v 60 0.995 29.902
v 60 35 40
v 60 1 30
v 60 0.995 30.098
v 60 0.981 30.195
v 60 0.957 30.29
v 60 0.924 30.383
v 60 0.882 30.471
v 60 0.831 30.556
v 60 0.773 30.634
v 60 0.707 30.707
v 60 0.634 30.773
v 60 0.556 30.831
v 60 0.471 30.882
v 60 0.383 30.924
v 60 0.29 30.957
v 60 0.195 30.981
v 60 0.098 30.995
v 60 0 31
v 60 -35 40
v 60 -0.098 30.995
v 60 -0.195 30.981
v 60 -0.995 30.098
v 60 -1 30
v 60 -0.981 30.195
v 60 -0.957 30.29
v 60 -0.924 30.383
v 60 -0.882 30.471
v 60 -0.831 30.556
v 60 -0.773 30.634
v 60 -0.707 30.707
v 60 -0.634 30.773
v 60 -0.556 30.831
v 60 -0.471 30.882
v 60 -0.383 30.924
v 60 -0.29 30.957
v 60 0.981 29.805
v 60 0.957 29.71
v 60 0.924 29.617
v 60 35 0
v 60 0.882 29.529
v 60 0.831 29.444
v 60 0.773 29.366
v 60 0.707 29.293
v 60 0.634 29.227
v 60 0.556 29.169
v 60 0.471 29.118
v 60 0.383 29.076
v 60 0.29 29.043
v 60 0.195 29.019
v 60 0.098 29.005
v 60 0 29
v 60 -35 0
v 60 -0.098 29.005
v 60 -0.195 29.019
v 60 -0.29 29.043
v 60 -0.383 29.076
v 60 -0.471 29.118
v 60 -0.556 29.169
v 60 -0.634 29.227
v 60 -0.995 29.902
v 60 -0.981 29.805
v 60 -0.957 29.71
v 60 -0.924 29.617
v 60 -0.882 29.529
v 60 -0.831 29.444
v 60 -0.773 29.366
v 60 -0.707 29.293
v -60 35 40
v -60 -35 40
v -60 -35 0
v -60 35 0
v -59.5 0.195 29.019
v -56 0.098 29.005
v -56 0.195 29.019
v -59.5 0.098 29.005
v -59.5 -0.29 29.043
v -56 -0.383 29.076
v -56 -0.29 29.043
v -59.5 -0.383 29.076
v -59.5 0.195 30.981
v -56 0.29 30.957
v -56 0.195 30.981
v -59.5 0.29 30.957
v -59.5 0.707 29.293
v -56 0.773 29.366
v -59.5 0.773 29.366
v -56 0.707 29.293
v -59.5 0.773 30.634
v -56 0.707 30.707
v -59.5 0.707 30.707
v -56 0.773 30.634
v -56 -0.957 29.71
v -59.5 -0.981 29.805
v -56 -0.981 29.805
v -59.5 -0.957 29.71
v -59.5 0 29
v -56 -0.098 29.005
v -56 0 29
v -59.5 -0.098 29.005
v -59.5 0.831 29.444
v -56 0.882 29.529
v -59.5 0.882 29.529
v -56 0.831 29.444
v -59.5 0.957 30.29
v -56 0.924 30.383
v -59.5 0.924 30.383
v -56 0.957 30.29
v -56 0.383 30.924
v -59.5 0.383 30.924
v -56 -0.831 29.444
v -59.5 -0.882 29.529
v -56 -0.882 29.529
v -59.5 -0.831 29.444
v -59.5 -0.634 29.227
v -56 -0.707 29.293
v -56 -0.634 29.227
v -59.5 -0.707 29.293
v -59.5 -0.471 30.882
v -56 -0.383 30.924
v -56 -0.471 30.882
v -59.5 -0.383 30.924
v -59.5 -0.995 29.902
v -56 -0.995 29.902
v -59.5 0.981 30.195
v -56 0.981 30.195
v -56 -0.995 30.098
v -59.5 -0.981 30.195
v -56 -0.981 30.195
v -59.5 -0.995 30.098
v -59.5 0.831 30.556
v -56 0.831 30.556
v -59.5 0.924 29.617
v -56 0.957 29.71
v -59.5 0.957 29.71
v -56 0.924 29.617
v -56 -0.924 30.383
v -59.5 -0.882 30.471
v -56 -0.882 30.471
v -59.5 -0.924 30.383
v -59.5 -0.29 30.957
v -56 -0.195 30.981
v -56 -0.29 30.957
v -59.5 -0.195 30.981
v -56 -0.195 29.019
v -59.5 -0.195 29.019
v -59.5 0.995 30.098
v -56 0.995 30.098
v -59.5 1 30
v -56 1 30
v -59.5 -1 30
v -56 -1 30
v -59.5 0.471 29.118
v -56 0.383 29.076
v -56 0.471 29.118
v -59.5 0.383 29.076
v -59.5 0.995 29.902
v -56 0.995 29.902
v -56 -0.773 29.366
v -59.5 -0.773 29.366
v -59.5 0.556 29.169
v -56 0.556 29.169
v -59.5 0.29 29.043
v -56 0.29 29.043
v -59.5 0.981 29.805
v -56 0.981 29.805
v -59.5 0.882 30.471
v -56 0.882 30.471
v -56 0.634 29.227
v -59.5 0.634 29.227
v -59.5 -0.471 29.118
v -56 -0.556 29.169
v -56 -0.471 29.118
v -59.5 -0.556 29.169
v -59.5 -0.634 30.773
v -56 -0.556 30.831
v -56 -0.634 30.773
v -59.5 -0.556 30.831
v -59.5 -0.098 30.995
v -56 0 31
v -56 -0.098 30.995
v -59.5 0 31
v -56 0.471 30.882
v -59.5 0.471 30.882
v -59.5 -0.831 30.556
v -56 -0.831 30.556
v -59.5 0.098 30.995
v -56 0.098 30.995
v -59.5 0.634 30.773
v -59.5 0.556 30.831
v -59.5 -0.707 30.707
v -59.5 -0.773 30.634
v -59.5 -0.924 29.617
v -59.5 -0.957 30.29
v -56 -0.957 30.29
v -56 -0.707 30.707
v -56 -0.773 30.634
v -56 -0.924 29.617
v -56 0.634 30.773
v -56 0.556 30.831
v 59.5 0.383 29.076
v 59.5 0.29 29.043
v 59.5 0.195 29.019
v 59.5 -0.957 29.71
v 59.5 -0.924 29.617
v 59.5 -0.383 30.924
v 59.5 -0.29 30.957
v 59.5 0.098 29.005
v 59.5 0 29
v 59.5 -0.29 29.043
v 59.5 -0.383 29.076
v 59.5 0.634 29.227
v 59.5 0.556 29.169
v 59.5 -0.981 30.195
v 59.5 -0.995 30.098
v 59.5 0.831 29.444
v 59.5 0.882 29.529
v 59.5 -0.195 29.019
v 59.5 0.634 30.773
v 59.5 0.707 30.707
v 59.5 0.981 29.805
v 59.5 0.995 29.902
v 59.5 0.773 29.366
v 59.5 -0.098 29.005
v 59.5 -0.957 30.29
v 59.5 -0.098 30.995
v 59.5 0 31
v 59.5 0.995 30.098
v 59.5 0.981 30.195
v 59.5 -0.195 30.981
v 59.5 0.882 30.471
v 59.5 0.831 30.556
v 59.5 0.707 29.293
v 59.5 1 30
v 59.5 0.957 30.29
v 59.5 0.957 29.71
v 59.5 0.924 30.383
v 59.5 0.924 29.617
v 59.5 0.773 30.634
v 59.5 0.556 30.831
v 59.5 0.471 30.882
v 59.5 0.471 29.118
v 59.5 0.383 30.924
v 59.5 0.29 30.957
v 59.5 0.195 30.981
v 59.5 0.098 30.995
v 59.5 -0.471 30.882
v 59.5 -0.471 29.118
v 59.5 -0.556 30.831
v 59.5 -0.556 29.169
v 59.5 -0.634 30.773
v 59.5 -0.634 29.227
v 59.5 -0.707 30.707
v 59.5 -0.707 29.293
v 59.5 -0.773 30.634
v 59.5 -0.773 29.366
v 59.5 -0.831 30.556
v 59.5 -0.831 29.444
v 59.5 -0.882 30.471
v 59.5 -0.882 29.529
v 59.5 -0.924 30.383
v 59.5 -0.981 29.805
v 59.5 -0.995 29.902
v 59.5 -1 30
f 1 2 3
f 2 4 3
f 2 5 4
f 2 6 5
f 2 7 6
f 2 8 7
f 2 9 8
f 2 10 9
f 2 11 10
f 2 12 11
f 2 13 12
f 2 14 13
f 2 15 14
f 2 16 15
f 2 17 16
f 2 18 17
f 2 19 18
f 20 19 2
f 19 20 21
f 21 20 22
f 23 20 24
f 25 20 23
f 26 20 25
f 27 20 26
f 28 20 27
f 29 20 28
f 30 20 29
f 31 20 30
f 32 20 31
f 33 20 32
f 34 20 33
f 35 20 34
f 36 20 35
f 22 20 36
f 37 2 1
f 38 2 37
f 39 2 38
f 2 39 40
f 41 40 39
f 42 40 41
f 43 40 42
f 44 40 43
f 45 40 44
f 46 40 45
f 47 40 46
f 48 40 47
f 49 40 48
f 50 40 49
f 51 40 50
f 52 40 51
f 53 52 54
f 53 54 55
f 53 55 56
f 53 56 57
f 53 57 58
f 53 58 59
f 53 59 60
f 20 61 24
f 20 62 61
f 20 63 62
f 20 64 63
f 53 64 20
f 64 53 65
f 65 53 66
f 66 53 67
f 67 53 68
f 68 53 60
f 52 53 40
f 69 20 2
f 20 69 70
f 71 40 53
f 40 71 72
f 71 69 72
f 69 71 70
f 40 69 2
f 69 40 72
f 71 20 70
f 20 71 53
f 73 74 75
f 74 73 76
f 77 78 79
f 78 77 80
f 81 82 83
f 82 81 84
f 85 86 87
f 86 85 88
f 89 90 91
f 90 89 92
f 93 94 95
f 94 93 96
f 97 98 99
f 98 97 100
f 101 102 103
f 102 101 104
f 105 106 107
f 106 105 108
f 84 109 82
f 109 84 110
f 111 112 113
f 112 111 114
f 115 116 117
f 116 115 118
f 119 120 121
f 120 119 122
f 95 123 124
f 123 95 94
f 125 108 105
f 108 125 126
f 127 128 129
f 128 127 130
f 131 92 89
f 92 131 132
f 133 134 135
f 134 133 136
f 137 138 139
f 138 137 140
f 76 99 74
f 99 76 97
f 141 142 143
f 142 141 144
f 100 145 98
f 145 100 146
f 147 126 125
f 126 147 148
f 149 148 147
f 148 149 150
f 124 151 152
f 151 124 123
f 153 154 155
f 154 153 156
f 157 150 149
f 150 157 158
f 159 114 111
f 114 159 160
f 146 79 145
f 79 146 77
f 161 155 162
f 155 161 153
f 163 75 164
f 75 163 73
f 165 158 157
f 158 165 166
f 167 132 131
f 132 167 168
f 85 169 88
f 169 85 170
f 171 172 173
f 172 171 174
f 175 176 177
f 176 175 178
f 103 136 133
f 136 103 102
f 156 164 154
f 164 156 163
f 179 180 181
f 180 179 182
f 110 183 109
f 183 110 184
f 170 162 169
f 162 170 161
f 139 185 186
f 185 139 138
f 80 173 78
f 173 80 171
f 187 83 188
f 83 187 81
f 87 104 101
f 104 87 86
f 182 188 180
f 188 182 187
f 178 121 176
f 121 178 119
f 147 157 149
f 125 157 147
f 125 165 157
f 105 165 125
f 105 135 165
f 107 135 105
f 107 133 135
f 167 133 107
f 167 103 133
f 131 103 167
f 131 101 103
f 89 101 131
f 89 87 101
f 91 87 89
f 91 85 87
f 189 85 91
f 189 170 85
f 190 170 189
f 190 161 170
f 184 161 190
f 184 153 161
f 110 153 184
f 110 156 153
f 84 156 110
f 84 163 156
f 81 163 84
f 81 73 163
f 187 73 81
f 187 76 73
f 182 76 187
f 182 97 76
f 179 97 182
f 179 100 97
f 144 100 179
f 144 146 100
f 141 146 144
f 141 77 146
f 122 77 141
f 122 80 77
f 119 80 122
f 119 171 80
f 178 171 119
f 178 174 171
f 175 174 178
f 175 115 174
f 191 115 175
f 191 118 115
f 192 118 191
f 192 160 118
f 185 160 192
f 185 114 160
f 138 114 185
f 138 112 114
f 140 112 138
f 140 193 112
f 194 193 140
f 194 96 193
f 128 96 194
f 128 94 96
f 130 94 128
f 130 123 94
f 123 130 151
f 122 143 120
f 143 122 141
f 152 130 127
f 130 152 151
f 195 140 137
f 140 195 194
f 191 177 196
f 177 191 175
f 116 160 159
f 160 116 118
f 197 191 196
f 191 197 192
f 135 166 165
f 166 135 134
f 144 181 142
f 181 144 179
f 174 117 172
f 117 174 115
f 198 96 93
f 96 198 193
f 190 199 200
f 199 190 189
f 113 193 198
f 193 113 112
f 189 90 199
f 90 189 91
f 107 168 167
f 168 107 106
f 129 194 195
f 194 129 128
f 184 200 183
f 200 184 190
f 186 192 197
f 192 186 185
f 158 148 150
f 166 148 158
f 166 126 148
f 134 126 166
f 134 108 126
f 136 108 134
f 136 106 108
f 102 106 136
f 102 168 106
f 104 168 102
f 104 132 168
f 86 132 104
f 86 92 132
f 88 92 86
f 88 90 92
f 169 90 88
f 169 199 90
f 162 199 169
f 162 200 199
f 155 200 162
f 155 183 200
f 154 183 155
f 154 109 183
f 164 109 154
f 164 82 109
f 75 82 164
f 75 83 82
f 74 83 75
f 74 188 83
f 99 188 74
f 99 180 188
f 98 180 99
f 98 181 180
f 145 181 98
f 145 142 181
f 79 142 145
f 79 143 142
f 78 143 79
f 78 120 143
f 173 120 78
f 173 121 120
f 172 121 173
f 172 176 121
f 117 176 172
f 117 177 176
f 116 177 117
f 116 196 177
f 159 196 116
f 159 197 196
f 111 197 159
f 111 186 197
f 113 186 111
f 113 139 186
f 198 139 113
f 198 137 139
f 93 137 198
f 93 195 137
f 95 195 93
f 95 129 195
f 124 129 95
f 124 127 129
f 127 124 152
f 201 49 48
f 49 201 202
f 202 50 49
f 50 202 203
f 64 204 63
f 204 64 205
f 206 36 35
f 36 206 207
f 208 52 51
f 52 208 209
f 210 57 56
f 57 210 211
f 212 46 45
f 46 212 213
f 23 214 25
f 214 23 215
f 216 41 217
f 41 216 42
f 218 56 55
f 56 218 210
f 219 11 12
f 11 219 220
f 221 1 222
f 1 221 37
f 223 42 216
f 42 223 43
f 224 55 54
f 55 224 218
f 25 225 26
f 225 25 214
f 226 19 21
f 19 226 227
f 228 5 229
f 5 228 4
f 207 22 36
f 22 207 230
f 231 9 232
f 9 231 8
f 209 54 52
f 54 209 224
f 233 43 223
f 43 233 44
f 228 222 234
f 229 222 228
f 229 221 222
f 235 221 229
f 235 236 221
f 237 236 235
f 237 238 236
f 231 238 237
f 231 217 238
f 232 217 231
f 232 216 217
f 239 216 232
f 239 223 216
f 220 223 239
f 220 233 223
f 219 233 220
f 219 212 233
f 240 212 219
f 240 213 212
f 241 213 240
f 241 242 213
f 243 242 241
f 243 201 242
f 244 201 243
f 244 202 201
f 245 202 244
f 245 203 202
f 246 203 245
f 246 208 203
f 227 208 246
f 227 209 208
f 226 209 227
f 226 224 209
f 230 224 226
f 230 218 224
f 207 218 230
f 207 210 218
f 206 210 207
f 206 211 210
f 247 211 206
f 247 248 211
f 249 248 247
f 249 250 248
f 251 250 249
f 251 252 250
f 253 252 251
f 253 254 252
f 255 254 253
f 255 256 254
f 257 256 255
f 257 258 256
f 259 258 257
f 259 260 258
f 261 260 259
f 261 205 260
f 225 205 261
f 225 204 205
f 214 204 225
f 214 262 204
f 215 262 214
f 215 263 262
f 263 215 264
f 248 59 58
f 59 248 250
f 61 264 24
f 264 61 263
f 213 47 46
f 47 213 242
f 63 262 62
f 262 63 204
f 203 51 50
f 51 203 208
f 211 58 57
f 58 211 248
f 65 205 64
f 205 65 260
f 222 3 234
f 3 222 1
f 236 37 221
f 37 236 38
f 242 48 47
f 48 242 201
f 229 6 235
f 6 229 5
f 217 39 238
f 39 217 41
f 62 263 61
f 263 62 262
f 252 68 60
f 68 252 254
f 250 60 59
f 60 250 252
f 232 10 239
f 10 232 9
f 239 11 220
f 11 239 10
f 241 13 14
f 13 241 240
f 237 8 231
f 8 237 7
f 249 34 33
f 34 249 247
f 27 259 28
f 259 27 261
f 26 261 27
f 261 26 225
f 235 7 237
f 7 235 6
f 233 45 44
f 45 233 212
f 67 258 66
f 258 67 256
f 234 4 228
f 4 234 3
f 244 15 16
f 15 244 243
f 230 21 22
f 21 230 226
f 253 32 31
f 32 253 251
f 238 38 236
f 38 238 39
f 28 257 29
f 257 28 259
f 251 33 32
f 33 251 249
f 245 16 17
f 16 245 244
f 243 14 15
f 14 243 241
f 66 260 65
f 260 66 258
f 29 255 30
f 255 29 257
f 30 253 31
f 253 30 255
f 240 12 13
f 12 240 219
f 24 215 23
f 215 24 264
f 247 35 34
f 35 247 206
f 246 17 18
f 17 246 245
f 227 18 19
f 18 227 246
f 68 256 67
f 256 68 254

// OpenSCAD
// Mini horizontal gel-electrophoresis box: open-top rectangular tank with a central
// raised gel-tray platform that divides the bottom into two buffer chambers.
// Print orientation: tank rests on the XY plane (z = 0) and builds upward (+Z).

// ---------------- Parameters ----------------
outer_x      = 120;   // outer tank length along X (mm)
outer_y      = 70;    // outer tank width along Y (mm)
outer_h      = 40;    // outer tank height along Z (mm)

wall         = 3;     // tank wall thickness (mm)
floor        = 3;     // tank floor thickness (mm)

platform_x   = 60;    // platform length along X (mm), centred
platform_top = 10;    // platform top height above inner floor (mm) -> z = 13

hole_d       = 2;     // electrode hole diameter (mm)
hole_y       = 0;     // electrode hole Y position (mm)
hole_z       = 30;    // electrode hole Z position (mm)

eps          = 0.5;   // overshoot for clean boolean cuts (mm)

$fn = 64;

// ---------------- Derived ----------------
inner_x = outer_x - 2 * wall;    // 114 mm
inner_y = outer_y - 2 * wall;    // 64 mm
inner_h = outer_h - floor;       // 37 mm (height above floor)

plat_h = floor + platform_top;   // 13 mm absolute height of platform top

// ---------------- Model ----------------
difference() {
    union() {
        // Tank body (outer block)
        translate([-outer_x / 2, -outer_y / 2, 0])
            cube([outer_x, outer_y, outer_h]);

        // Central raised platform for the gel tray
        // Spans the full inner width (Y), centred in X
        translate([-platform_x / 2, -inner_y / 2, floor])
            cube([platform_x, inner_y, plat_h - floor]);
    }

    // Electrode holes through each end wall, along X
    for (sx = [-1, 1])
        translate([sx * (outer_x / 2 - eps), hole_y, hole_z])
            rotate([0, 90, 0])
                cylinder(d = hole_d, h = wall + eps);
}
